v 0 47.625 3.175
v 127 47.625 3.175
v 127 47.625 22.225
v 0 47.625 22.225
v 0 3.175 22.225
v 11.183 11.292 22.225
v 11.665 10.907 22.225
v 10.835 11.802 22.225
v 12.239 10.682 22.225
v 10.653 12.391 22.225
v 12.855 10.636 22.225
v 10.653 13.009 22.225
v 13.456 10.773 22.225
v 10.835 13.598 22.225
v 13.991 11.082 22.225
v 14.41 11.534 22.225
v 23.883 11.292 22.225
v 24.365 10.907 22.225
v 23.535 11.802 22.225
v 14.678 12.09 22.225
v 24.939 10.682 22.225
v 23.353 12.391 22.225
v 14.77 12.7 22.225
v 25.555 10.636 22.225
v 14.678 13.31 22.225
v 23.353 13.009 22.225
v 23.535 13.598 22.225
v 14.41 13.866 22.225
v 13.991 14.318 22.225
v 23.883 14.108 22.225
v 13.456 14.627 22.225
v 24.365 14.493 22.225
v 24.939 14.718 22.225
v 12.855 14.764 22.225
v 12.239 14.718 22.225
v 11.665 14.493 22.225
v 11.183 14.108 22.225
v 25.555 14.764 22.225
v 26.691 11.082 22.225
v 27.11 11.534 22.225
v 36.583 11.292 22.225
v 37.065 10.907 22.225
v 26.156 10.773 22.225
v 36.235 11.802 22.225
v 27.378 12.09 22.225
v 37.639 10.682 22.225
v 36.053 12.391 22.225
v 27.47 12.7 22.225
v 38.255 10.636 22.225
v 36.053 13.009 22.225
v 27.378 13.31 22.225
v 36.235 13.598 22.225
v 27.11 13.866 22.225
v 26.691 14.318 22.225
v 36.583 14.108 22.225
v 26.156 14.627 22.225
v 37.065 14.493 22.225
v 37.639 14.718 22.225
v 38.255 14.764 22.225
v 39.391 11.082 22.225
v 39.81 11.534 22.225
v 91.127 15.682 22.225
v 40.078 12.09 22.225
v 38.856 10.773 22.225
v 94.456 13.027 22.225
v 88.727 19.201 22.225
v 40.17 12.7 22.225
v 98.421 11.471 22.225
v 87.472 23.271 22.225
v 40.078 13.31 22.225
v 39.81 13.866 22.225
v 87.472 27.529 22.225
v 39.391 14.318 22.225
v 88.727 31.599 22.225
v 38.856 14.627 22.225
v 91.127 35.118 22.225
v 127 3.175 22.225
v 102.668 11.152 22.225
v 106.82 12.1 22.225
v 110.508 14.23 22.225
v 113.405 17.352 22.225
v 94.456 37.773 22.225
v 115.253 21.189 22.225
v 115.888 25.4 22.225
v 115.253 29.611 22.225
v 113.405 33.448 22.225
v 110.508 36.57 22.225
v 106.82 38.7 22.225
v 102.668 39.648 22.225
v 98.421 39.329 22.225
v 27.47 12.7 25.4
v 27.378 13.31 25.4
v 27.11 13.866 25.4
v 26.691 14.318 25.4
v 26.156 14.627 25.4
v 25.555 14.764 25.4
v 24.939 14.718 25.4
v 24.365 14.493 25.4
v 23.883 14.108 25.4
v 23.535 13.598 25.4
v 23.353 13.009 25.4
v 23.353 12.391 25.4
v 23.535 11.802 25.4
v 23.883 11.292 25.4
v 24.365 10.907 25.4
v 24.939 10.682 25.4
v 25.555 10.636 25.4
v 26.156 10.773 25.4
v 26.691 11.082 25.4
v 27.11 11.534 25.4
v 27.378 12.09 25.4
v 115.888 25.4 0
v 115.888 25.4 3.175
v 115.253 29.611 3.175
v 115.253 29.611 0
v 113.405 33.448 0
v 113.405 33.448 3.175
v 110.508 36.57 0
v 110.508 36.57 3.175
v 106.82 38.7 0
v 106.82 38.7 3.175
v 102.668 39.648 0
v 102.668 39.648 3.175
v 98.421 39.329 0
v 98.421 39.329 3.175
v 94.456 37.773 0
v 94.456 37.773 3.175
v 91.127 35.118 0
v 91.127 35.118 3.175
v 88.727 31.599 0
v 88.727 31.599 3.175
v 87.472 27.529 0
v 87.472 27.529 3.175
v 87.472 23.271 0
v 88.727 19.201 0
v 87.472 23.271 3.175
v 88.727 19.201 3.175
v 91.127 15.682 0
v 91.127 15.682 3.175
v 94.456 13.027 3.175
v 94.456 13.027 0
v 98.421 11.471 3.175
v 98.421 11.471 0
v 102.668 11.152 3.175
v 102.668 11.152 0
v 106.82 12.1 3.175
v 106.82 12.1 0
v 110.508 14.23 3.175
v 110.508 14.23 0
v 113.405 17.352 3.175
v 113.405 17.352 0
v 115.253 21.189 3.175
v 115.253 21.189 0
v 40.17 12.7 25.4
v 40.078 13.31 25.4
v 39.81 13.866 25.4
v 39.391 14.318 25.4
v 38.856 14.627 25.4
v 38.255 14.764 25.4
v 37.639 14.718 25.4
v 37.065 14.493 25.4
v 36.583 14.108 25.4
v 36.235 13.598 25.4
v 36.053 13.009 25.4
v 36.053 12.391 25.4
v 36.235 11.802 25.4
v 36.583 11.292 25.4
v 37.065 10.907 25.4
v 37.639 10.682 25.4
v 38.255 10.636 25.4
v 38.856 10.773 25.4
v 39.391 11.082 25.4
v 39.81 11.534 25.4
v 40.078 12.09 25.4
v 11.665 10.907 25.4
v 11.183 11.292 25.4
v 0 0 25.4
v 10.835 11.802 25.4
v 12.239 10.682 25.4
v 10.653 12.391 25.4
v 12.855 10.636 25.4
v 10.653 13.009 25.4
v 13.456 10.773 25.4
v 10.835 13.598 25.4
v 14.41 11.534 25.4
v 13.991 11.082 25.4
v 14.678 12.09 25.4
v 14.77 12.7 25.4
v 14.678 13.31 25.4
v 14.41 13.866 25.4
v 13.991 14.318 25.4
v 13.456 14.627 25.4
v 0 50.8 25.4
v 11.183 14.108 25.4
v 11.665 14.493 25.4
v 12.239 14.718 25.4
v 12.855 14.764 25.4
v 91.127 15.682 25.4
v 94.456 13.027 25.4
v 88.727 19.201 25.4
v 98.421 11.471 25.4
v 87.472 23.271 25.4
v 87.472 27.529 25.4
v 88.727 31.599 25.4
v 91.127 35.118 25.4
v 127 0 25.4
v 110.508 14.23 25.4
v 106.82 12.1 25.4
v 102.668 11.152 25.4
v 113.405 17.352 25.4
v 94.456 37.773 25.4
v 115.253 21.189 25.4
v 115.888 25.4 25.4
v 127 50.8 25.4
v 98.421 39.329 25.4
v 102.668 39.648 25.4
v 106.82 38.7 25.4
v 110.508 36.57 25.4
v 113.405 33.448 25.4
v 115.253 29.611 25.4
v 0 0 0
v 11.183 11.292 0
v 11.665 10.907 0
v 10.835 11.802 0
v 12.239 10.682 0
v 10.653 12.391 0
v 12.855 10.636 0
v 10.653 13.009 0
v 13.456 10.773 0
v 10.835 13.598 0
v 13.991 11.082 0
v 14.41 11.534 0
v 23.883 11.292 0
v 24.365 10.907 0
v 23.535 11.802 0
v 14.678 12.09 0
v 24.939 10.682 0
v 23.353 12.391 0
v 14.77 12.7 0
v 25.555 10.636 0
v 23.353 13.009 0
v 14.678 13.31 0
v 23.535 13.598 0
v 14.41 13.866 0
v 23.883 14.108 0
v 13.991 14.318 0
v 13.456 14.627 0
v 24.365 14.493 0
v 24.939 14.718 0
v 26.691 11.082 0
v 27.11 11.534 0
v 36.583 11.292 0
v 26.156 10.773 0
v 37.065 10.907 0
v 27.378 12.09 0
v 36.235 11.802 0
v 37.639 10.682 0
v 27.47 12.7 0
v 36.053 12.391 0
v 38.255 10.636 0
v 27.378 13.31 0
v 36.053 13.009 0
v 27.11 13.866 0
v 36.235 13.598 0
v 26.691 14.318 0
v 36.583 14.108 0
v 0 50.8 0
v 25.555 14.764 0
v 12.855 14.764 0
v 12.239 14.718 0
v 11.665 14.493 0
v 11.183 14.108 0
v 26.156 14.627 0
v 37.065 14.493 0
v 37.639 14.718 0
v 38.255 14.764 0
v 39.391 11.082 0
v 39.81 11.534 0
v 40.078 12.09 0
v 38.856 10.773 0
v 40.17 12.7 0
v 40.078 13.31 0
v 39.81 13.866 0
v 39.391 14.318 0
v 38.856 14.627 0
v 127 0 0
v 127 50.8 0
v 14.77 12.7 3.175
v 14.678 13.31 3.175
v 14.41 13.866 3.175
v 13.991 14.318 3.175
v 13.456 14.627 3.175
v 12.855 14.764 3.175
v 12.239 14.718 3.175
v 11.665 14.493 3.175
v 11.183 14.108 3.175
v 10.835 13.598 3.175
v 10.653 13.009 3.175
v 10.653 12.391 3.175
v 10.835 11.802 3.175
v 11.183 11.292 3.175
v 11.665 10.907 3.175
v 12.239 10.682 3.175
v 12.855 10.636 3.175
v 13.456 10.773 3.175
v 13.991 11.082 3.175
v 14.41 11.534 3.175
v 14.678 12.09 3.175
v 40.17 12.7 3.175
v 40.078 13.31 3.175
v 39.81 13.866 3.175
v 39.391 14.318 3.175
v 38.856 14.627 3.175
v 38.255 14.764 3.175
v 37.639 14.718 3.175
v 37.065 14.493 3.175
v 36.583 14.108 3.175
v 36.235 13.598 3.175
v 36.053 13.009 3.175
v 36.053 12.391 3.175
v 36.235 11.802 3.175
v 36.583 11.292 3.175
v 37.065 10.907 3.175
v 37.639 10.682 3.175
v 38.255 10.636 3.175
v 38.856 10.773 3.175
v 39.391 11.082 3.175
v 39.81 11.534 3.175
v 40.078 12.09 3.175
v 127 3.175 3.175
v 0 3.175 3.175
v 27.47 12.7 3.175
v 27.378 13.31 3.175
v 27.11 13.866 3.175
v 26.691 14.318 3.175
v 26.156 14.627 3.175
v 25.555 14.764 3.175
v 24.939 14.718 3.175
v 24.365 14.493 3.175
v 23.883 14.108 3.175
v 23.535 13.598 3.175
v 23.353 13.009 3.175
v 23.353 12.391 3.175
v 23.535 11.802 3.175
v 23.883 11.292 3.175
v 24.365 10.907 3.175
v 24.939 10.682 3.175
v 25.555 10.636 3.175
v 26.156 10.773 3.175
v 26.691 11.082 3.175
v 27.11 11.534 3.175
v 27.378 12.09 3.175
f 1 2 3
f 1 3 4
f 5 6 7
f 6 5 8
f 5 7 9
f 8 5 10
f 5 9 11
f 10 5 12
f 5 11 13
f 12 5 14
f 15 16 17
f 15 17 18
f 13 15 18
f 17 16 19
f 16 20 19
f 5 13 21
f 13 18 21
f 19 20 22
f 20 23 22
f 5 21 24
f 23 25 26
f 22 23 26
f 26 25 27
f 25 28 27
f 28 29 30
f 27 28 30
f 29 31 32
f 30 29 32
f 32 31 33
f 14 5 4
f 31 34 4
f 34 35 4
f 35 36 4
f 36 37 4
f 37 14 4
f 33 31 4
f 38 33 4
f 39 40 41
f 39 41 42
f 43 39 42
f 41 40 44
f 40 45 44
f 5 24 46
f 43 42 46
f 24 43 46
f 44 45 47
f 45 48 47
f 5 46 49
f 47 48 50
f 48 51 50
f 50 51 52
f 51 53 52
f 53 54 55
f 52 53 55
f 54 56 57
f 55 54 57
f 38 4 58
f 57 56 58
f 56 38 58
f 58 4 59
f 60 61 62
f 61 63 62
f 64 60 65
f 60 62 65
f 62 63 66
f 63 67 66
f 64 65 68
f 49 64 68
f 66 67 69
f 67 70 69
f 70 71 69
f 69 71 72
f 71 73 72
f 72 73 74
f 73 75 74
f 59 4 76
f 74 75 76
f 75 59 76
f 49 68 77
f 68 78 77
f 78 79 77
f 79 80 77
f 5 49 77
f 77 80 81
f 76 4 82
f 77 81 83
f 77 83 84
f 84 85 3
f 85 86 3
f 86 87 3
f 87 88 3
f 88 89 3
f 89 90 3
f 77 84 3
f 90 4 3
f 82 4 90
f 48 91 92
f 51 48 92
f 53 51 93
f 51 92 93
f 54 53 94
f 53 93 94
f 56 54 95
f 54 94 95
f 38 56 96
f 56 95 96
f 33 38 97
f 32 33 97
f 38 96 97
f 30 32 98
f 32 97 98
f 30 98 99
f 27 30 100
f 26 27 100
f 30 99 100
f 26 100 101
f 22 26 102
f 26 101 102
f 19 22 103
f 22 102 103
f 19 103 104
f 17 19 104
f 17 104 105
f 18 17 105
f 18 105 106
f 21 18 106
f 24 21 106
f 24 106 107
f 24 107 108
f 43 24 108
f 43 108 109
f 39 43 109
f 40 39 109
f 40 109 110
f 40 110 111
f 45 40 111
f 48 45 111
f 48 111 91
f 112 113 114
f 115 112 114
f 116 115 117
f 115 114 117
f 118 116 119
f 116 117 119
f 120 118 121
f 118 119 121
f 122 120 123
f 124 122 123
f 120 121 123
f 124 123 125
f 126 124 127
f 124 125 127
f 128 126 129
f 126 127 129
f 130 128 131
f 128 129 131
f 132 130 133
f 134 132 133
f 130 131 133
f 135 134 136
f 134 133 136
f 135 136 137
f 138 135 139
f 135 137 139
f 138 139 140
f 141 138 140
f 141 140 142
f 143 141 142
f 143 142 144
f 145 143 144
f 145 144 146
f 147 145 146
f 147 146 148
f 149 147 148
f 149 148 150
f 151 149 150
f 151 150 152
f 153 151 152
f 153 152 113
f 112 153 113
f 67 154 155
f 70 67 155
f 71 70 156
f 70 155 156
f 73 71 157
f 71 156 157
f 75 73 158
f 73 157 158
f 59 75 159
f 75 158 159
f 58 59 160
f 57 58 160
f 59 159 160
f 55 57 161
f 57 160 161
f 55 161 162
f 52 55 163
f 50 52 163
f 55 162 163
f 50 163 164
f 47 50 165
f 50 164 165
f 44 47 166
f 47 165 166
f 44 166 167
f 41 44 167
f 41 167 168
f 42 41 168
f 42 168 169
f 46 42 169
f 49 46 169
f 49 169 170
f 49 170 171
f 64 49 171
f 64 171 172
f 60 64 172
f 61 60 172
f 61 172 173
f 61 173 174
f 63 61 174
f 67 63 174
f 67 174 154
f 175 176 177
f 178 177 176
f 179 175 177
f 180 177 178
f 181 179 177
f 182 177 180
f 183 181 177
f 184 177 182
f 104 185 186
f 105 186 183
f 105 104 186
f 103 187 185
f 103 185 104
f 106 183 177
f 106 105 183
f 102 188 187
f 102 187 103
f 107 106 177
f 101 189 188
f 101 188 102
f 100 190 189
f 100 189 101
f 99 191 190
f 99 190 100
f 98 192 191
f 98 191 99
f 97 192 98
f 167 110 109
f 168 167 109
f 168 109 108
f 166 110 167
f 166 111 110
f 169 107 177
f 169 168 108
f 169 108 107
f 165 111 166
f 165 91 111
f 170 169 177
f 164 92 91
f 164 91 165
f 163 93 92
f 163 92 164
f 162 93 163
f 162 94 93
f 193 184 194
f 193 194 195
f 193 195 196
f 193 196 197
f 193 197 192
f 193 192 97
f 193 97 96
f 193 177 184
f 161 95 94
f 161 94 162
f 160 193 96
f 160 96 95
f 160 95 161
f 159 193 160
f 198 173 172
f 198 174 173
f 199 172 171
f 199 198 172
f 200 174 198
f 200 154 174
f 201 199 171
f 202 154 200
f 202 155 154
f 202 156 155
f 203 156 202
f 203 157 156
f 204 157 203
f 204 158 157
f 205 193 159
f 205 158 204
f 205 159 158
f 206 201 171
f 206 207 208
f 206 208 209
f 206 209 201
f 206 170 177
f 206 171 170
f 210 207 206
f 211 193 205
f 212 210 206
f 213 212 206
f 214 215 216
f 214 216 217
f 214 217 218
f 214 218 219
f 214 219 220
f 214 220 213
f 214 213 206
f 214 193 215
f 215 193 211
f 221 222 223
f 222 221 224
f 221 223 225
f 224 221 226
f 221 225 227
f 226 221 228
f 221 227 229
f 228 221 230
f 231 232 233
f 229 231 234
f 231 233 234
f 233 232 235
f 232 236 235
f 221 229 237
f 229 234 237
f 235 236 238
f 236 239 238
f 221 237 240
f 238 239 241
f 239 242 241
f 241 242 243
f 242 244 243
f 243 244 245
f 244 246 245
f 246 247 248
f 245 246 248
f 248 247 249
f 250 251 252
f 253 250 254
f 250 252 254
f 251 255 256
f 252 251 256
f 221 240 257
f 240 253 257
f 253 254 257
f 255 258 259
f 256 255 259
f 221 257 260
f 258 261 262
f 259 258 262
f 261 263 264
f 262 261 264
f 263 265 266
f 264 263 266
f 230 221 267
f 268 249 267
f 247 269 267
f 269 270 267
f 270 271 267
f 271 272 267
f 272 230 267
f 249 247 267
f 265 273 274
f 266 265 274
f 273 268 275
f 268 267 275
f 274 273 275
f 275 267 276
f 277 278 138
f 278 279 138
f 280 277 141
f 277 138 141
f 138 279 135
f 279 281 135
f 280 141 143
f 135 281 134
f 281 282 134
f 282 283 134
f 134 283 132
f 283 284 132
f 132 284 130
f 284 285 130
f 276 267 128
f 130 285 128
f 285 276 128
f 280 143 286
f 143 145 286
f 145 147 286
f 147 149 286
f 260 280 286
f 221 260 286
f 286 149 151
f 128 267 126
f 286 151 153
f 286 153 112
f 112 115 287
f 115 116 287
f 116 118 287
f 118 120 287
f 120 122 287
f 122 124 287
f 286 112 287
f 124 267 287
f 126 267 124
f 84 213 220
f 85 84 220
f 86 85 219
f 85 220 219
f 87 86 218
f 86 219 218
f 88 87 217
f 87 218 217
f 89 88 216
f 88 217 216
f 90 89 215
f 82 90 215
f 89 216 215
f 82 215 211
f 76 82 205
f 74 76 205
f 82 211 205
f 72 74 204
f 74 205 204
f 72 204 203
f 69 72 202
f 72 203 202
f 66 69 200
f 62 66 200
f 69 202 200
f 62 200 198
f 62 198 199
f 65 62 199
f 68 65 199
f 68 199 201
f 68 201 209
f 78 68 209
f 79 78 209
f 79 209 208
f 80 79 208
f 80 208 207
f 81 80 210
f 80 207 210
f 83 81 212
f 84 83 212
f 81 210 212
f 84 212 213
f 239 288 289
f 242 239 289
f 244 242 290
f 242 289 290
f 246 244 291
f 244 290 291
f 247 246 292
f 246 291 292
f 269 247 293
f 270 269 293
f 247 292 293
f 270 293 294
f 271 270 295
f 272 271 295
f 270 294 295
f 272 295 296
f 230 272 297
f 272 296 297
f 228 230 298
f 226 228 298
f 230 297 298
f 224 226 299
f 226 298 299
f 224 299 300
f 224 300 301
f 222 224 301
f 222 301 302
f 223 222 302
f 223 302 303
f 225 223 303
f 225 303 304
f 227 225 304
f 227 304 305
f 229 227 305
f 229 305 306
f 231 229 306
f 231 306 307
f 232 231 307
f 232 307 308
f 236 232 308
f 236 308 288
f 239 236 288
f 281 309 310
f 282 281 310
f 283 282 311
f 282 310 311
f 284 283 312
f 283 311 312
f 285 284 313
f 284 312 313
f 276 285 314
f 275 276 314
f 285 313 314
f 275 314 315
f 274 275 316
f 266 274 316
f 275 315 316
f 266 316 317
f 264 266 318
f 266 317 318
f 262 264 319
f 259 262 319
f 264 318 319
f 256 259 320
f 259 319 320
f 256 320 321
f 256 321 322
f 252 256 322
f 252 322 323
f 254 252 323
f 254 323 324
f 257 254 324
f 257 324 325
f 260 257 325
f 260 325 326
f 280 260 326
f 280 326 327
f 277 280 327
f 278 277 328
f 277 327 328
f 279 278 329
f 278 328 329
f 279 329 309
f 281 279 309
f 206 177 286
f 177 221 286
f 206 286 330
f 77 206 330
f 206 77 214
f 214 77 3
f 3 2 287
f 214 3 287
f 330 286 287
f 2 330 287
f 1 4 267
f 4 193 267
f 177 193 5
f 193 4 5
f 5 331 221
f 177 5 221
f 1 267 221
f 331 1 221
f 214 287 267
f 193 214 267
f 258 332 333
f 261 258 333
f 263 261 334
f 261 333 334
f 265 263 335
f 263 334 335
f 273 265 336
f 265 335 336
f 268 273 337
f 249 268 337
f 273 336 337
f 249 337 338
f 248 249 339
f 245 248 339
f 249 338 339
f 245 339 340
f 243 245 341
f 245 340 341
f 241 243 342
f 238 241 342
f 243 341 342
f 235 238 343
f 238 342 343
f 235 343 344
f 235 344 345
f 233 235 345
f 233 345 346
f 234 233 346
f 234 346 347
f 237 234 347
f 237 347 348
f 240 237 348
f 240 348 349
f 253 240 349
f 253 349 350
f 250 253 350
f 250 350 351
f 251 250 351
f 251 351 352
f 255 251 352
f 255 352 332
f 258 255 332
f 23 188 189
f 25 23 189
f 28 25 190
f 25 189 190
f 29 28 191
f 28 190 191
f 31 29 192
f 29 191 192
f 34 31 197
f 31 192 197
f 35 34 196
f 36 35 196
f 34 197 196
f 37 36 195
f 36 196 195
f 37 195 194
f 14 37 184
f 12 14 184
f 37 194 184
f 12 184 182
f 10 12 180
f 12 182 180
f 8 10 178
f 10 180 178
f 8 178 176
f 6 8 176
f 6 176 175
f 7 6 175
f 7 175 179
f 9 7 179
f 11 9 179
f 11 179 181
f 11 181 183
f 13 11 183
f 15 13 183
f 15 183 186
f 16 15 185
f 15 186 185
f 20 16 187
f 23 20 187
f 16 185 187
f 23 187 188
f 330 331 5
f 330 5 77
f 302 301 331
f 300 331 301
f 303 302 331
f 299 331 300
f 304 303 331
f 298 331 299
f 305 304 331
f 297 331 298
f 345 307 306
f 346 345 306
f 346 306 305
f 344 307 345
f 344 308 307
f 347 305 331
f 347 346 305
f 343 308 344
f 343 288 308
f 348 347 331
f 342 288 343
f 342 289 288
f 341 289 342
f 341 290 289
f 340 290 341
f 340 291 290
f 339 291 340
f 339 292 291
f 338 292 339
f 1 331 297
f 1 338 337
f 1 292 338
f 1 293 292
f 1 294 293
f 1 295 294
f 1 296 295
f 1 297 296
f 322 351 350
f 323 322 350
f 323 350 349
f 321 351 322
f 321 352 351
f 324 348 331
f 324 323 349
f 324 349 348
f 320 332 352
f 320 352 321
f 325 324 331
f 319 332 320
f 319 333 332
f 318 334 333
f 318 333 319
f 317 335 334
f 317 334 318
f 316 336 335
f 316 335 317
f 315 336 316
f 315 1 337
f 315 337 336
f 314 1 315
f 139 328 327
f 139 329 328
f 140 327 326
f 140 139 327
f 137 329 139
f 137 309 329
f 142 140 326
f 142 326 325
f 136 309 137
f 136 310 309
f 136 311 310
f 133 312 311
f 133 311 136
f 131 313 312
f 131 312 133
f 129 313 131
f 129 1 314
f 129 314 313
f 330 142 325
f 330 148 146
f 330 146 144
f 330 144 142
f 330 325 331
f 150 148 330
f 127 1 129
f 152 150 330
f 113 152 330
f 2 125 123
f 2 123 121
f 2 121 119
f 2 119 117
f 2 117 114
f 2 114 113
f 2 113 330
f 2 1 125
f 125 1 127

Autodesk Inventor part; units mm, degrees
ref_plane "YZ Plane" through (0, 0, 0) normal (1, 0, 0) x (0, 1, 0)
ref_plane "XZ Plane" through (0, 0, 0) normal (0, 1, 0) x (-1, 0, 0)
ref_plane "XY Plane" through (0, 0, 0) normal (0, 0, 1) x (1, 0, 0)
sketch "Sketch1" plane through (0, 0, 0) normal (0, 0, 1) x (1, 0, 0)
  line L0 (0, 0) -> (127, 0)
  line L1 (127, 0) -> (127, 50.8)
  line L2 (127, 50.8) -> (0, 50.8)
  line L3 (0, 50.8) -> (0, 0)
  dimension "d0" = 50.8
  dimension "d1" = 127
extrude "Extrusion1" add sketch "Sketch1" along normal blind 25.4
shell "Shell1" thickness 3.175 removed faces 2 at (0, 33.8667, 16.9333) at (127, 16.9333, 8.4667)
sketch "Sketch2" plane through (0, 0, 25.4) normal (0, 0, 1) x (1, 0, 0)
  line L0 (0, 3.175) -> (0, 47.625) projected
  line L1 (0, 25.4) -> (101.6, 25.4)
  circle A0 centre (101.6, 25.4) radius 14.2875
  line L2 (127, 0) -> (127, 50.8) projected
  point P0 (0, 0)
  dimension "d5" = 28.575
  dimension "d9" = 25.4
extrude "Extrusion2" cut sketch "Sketch2" against normal through all
sketch "Sketch3" plane through (0, 0, 25.4) normal (0, 0, 1) x (1, 0, 0)
  line L0 (0, 50.8) -> (0, 12.7)
  line L1 (0, 3.175) -> (0, 47.625) projected
  line L2 (0, 12.7) -> (12.7, 12.7)
  circle A0 centre (12.7, 12.7) radius 2.0701
  circle A1 centre (25.4, 12.7) radius 2.0701
  circle A2 centre (38.1, 12.7) radius 2.0701
  point P0 (0, 0)
  dimension "d12" = 12.7
  dimension "d13" = 4.1402
  dimension "d16" = 12.7
  dimension "d23" = 12.7
extrude "Extrusion3" cut sketch "Sketch3" against normal through all
properties part number "Intake mount"
